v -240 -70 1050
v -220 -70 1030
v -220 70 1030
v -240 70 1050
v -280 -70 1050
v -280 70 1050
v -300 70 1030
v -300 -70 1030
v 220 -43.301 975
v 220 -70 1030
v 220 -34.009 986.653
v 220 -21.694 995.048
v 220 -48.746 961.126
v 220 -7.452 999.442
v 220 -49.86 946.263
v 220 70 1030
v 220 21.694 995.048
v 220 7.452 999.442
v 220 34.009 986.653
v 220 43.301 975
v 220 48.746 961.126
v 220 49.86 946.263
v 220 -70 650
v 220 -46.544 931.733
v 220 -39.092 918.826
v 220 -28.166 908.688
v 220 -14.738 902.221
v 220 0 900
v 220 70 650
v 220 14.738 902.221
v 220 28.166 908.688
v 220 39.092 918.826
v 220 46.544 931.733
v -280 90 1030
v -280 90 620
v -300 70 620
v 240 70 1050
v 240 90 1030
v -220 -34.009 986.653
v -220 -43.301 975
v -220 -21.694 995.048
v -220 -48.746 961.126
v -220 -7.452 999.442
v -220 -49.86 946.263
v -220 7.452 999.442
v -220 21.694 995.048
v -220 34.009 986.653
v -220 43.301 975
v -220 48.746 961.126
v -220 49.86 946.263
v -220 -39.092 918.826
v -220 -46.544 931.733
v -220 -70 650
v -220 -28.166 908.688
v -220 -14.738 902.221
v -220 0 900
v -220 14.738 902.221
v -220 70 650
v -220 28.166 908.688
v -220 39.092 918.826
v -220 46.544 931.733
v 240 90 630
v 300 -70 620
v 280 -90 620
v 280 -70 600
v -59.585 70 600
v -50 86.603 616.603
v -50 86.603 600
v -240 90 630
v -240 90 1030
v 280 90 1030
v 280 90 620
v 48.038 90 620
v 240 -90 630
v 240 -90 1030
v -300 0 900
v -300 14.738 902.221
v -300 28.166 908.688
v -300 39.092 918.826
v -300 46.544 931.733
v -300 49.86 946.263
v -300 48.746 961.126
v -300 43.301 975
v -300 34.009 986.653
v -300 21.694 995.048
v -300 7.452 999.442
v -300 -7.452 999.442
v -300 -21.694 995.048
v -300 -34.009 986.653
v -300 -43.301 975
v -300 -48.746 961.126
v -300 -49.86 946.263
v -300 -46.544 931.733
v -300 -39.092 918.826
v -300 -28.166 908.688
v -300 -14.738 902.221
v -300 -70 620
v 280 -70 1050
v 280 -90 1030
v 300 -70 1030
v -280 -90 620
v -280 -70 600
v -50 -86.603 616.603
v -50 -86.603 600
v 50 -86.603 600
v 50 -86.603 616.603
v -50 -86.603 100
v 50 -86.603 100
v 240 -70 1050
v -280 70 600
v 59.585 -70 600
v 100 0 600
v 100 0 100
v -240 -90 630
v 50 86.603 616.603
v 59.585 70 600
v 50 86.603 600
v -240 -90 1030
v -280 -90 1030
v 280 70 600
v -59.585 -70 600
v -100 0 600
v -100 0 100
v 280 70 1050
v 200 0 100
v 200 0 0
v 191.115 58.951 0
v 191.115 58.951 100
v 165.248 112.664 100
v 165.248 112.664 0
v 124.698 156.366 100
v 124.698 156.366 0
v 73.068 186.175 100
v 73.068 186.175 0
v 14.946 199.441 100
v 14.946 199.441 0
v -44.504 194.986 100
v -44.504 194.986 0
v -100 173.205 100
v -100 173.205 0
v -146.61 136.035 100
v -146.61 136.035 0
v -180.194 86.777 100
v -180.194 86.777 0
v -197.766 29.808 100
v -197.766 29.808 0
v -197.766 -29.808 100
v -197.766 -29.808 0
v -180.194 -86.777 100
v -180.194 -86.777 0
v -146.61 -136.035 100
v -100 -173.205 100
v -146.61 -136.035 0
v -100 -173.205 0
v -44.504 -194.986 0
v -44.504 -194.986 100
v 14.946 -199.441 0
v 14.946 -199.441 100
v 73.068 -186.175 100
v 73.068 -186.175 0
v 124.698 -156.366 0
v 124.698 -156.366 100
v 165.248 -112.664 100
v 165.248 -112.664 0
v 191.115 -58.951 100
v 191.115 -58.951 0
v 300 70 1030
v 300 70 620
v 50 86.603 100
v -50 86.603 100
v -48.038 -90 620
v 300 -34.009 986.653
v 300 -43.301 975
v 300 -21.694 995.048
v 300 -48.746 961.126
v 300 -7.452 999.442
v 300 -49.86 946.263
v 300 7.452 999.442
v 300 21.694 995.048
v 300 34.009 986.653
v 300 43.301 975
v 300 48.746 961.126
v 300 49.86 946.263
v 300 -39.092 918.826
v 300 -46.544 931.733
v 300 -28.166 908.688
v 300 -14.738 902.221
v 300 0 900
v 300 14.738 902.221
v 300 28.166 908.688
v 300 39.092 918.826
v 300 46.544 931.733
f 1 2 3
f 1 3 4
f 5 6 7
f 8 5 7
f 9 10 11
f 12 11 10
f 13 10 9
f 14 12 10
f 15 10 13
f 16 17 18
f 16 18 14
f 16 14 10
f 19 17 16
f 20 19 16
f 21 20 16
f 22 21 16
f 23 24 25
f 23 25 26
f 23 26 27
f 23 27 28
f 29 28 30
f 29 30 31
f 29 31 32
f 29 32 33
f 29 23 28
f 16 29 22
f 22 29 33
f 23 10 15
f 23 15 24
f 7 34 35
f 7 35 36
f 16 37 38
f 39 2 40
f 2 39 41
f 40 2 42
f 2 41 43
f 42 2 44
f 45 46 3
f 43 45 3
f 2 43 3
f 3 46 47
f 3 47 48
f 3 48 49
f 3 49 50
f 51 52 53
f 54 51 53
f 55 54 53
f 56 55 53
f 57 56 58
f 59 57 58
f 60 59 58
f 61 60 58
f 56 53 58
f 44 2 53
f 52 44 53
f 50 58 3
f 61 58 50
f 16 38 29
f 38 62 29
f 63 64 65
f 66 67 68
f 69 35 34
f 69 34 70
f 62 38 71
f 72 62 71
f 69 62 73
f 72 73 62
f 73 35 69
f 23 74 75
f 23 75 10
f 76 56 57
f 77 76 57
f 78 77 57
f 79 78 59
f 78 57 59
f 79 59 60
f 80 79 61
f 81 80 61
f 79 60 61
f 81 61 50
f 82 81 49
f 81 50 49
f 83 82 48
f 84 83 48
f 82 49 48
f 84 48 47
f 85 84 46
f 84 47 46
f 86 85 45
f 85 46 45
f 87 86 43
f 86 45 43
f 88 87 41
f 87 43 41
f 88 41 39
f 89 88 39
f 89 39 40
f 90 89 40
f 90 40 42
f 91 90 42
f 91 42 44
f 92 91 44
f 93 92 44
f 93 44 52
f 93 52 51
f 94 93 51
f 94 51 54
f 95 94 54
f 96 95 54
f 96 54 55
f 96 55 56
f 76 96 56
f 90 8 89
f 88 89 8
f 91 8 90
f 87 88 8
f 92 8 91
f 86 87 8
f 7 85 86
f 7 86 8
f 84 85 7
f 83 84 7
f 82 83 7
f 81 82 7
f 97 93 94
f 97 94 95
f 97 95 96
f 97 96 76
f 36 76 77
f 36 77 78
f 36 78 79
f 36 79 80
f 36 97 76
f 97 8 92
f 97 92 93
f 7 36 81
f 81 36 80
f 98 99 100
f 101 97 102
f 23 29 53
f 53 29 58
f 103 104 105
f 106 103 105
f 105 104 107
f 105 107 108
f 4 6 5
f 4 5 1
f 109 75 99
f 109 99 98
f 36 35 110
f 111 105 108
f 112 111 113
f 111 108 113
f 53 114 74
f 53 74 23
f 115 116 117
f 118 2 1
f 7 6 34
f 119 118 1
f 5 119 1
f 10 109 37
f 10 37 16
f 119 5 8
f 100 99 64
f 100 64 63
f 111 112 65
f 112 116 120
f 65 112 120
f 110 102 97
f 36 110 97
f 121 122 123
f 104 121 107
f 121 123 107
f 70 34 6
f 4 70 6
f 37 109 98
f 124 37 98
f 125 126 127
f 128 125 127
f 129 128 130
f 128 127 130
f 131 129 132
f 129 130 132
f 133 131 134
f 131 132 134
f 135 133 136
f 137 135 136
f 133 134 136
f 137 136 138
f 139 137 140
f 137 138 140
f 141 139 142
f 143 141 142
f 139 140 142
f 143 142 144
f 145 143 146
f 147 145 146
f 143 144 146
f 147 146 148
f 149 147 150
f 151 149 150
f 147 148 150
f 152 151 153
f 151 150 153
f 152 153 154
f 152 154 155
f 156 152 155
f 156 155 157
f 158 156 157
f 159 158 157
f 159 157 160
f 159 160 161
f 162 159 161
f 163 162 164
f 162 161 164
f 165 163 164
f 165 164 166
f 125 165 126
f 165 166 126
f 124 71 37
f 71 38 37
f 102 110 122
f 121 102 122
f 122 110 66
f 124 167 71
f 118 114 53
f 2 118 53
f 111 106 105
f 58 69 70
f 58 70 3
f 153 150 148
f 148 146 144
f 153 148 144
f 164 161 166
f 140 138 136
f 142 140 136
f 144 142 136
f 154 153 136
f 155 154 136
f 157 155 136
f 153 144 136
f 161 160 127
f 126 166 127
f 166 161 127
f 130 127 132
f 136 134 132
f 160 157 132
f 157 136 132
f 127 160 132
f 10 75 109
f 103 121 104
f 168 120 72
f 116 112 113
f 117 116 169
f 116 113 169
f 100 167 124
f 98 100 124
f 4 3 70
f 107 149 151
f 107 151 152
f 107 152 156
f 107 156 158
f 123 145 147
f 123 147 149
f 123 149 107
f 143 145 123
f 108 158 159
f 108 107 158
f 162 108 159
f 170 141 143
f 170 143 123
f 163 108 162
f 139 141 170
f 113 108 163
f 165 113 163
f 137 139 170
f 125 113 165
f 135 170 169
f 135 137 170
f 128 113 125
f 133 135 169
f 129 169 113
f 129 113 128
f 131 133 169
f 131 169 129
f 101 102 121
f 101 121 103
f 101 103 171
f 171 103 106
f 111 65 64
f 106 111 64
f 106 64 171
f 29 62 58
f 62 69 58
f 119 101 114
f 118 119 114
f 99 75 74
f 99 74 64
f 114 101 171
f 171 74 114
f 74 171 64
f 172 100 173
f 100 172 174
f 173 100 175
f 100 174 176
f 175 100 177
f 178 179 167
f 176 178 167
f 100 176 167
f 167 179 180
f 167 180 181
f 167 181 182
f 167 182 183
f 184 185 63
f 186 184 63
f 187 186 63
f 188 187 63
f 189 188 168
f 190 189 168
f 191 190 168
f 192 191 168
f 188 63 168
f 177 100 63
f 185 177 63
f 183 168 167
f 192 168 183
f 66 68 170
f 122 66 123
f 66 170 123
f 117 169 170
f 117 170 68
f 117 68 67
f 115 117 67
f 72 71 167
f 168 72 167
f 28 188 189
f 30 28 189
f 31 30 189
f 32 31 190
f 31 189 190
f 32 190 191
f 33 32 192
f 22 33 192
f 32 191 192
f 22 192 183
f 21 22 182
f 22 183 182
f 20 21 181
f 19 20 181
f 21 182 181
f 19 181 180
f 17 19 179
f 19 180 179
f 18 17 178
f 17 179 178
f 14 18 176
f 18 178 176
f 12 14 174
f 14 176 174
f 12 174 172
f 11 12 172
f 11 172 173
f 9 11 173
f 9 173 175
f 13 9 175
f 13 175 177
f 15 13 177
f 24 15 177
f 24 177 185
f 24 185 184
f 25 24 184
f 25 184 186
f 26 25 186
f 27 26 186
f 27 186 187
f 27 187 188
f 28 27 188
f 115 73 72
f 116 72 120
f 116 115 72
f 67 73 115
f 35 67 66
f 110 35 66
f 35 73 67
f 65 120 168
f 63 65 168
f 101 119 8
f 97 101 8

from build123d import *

# Parameters (mm, degrees)
CROQUIS1_R              = 200
SALIENTE_EXTRUIR1_DEPTH = 100
SALIENTE_EXTRUIR2_DEPTH = 500
CROQUIS3_W              = 600
CROQUIS3_H              = 180
SALIENTE_EXTRUIR3_DEPTH = 50
CROQUIS4_W              = 80
CROQUIS4_H              = 180
SALIENTE_EXTRUIR4_DEPTH = 400
CROQUIS5_R              = 50
CORTAR_EXTRUIR1_DEPTH   = 1226.765067213


with BuildPart() as part:
    # Croquis1 → Saliente-Extruir1 (new body)
    with BuildSketch(Plane.XY):
        Circle(CROQUIS1_R)
    extrude(amount=SALIENTE_EXTRUIR1_DEPTH)

    # Croquis2 → Saliente-Extruir2 (add)
    with BuildSketch(Plane.XY.offset(100)):
        Polygon((100, 0), (50, 86.602540378), (-50, 86.602540378), (-100, 0), (-50, -86.602540378), (50, -86.602540378), align=None)
    extrude(amount=SALIENTE_EXTRUIR2_DEPTH)

    # Croquis3 → Saliente-Extruir3 (add)
    with BuildSketch(Plane.XY.offset(600)):
        Rectangle(CROQUIS3_W, CROQUIS3_H)
    extrude(amount=SALIENTE_EXTRUIR3_DEPTH)

    # Croquis4 → Saliente-Extruir4 (add)
    with BuildSketch(Plane.XY.offset(650)):
        with Locations((-260, 0)):
            Rectangle(CROQUIS4_W, CROQUIS4_H)
        with Locations((260, 0)):
            Rectangle(CROQUIS4_W, CROQUIS4_H)
    extrude(amount=SALIENTE_EXTRUIR4_DEPTH)

    # Chaflán1
    # the kernel refuses this chamfer: 20 mm, written as the material it takes off along each edge
    with BuildSketch(Plane(origin=(-233.333333333, 76.666666667, 1036.666666667), x_dir=(0.7071067811865475, -0.7071067811865475, 0), z_dir=(0.5773502691896257, 0.5773502691896257, 0.5773502691896257)), Plane(origin=(-286.666666667, 76.666666667, 1036.666666667), x_dir=(0, -0.7071067811865475, 0.7071067811865475), z_dir=(-0.577350269189627, 0.5773502691896253, 0.5773502691896253)), Plane(origin=(-286.666666667, -76.666666667, 613.333333333), x_dir=(-0.7071067811865475, 0, 0.7071067811865475), z_dir=(-0.5773502691896257, -0.5773502691896257, -0.5773502691896257)), Plane(origin=(286.666666667, 76.666666667, 1036.666666667), x_dir=(0.7071067811865466, -0.7071067811865486, 0), z_dir=(0.5773502691896264, 0.5773502691896247, 0.5773502691896264)), Plane(origin=(286.666666667, 76.666666667, 613.333333333), x_dir=(-2.009718347115232e-15, -0.7071067811865475, -0.7071067811865475), z_dir=(0.5773502691896264, 0.5773502691896247, -0.5773502691896264)), Plane(origin=(286.666666667, -76.666666667, 613.333333333), x_dir=(0, -0.7071067811865475, 0.7071067811865475), z_dir=(0.5773502691896257, -0.5773502691896257, -0.5773502691896257)), Plane(origin=(233.333333333, 76.666666667, 1036.666666667), x_dir=(1.004859173557616e-15, -0.7071067811865475, 0.7071067811865475), z_dir=(-0.5773502691896263, 0.5773502691896251, 0.5773502691896258))) as chafl_n1_piece_1:
        Polygon((-14.142135624, 8.164965809), (14.142135624, 8.164965809), (0, -16.329931619), align=None)
    extrude(amount=25.403411844, mode=Mode.SUBTRACT)
    with BuildSketch(Plane(origin=(233.333333333, -76.666666667, 1036.666666667), x_dir=(0, 0.7071067811865472, 0.7071067811865478), z_dir=(-0.5773502691896256, -0.5773502691896261, 0.5773502691896256)), Plane(origin=(-233.333333333, -76.666666667, 1036.666666667), x_dir=(-0.7071067811865475, 0, 0.7071067811865475), z_dir=(0.5773502691896255, -0.5773502691896263, 0.5773502691896255)), Plane(origin=(-286.666666667, 76.666666667, 613.333333333), x_dir=(0, -0.7071067811865475, -0.7071067811865475), z_dir=(-0.5773502691896257, 0.5773502691896257, -0.5773502691896257)), Plane(origin=(-286.666666667, -76.666666667, 1036.666666667), x_dir=(-0.7071067811865475, 0, -0.7071067811865475), z_dir=(-0.5773502691896257, -0.5773502691896257, 0.5773502691896257)), Plane(origin=(286.666666667, -76.666666667, 1036.666666667), x_dir=(0.7071067811865475, 0.7071067811865475, 0), z_dir=(0.5773502691896257, -0.5773502691896257, 0.5773502691896257))) as chafl_n1_piece_2:
        Polygon((-14.142135624, -8.164965809), (14.142135624, -8.164965809), (0, 16.329931619), align=None)
    extrude(amount=25.403411844, mode=Mode.SUBTRACT)
    with BuildSketch(Plane(origin=(-220, 90, 650), x_dir=(-0.9996219169112968, 0.027495876610586317, 0), z_dir=(0, 0, 1)), Plane(origin=(220, -90, 650), x_dir=(0.9996219169112968, -0.027495876610585626, 0), z_dir=(0, 0, 1))) as chafl_n1_piece_3:
        with BuildLine():
            Line((20.573463904, 0), (-1.130943098, 20.54235587))
            Line((-1.130943098, 20.54235587), (-1.530791864, 20.53135752))
            ThreePointArc((-1.530791864, 20.53135752), (-0.682584541, 10.267956593), (-0.399848767, -0.010998351))
            Line((-0.399848767, -0.010998351), (0.010998351, -0.399848767))
            ThreePointArc((0.010998351, -0.399848767), (10.289953294, -0.117112992), (20.584462254, -0.399848767))
            Line((20.584462254, -0.399848767), (20.573463904, 0))
        make_face()
    extrude(amount=451.433659759, mode=Mode.SUBTRACT)
    with BuildSketch(Plane(origin=(-220, -90, 650), x_dir=(-0.9996219169112968, -0.027495876610586282, 0), z_dir=(0, 0, 1)), Plane(origin=(220, 90, 650), x_dir=(0.9996219169112968, 0.027495876610586355, 0), z_dir=(0, 0, 1))) as chafl_n1_piece_4:
        with BuildLine():
            Line((20.573463904, 0), (-1.130943098, -20.54235587))
            Line((-1.130943098, -20.54235587), (-1.530791864, -20.53135752))
            ThreePointArc((-1.530791864, -20.53135752), (-0.682584541, -10.267956593), (-0.399848767, 0.010998351))
            Line((-0.399848767, 0.010998351), (0.010998351, 0.399848767))
            ThreePointArc((0.010998351, 0.399848767), (10.289953294, 0.117112992), (20.584462254, 0.399848767))
            Line((20.584462254, 0.399848767), (20.573463904, 0))
        make_face()
    extrude(amount=451.433659759, mode=Mode.SUBTRACT)
    with BuildSketch(Plane(origin=(-300, 90, 548.566340241), x_dir=(0.9996219169112968, 0.027495876610586282, 0), z_dir=(0, 0, 1)), Plane(origin=(300, 90, 1101.433659759), x_dir=(-0.9996219169112968, 0.027495876610586282, 0), z_dir=(0, 0, -1))) as chafl_n1_piece_5:
        with BuildLine():
            Line((20.573463904, 0), (-1.130943098, -20.54235587))
            Line((-1.130943098, -20.54235587), (-1.530791864, -20.53135752))
            ThreePointArc((-1.530791864, -20.53135752), (-0.682584541, -10.267956593), (-0.399848767, 0.010998351))
            Line((-0.399848767, 0.010998351), (0.010998351, 0.399848767))
            ThreePointArc((0.010998351, 0.399848767), (10.289953294, 0.117112992), (20.584462254, 0.399848767))
            Line((20.584462254, 0.399848767), (20.573463904, 0))
        make_face()
    extrude(amount=552.867319519, mode=Mode.SUBTRACT)
    with BuildSketch(Plane(origin=(-300, -90, 548.566340241), x_dir=(0.9996219169112968, -0.027495876610586282, 0), z_dir=(0, 0, 1)), Plane(origin=(300, -90, 1101.433659759), x_dir=(-0.9996219169112968, -0.027495876610586282, 0), z_dir=(0, 0, -1))) as chafl_n1_piece_6:
        with BuildLine():
            Line((20.573463904, 0), (-1.130943098, 20.54235587))
            Line((-1.130943098, 20.54235587), (-1.530791864, 20.53135752))
            ThreePointArc((-1.530791864, 20.53135752), (-0.682584541, 10.267956593), (-0.399848767, -0.010998351))
            Line((-0.399848767, -0.010998351), (0.010998351, -0.399848767))
            ThreePointArc((0.010998351, -0.399848767), (10.289953294, -0.117112992), (20.584462254, -0.399848767))
            Line((20.584462254, -0.399848767), (20.573463904, 0))
        make_face()
    extrude(amount=552.867319519, mode=Mode.SUBTRACT)
    with BuildSketch(Plane(origin=(-351.433659759, -90, 1050), x_dir=(0, -0.02749587661058643, -0.9996219169112968), z_dir=(1, 0, 0)), Plane(origin=(-168.566340241, 90, 1050), x_dir=(0, 0.02749587661058643, -0.9996219169112968), z_dir=(-1, 0, 0))) as chafl_n1_piece_7:
        with BuildLine():
            Line((20.573463904, 0), (-1.130943098, 20.54235587))
            Line((-1.130943098, 20.54235587), (-1.530791864, 20.53135752))
            ThreePointArc((-1.530791864, 20.53135752), (-0.682584541, 10.267956593), (-0.399848767, -0.010998351))
            Line((-0.399848767, -0.010998351), (0.010998351, -0.399848767))
            ThreePointArc((0.010998351, -0.399848767), (10.289953294, -0.117112992), (20.584462254, -0.399848767))
            Line((20.584462254, -0.399848767), (20.573463904, 0))
        make_face()
    extrude(amount=182.867319519, mode=Mode.SUBTRACT)
    with BuildSketch(Plane(origin=(-220, -141.433659759, 1050), x_dir=(0.02749587661058643, 0, -0.9996219169112968), z_dir=(0, 1, 0)), Plane(origin=(220, -141.433659759, 1050), x_dir=(0.9996219169112969, 0, 0.027495876610582178), z_dir=(0, 1, 0))) as chafl_n1_piece_8:
        with BuildLine():
            Line((20.573463904, 0), (-1.130943098, 20.54235587))
            Line((-1.130943098, 20.54235587), (-1.530791864, 20.53135752))
            ThreePointArc((-1.530791864, 20.53135752), (-0.682584541, 10.267956593), (-0.399848767, -0.010998351))
            Line((-0.399848767, -0.010998351), (0.010998351, -0.399848767))
            ThreePointArc((0.010998351, -0.399848767), (10.289953294, -0.117112992), (20.584462254, -0.399848767))
            Line((20.584462254, -0.399848767), (20.573463904, 0))
        make_face()
    extrude(amount=282.867319519, mode=Mode.SUBTRACT)
    with BuildSketch(Plane(origin=(-300, 141.433659759, 1050), x_dir=(0.9996219169112969, 0, 0.02749587661058214), z_dir=(0, -1, 0)), Plane(origin=(300, 141.433659759, 1050), x_dir=(0.027495876610587815, 0, -0.9996219169112968), z_dir=(0, -1, 0)), Plane(origin=(-300, -141.433659759, 600), x_dir=(0.9996219169112968, 0, -0.027495876610587663), z_dir=(0, 1, 0)), Plane(origin=(300, 141.433659759, 600), x_dir=(-0.9996219169112968, 0, -0.027495876610587663), z_dir=(0, -1, 0))) as chafl_n1_piece_9:
        with BuildLine():
            Line((20.573463904, 0), (-1.130943098, -20.54235587))
            Line((-1.130943098, -20.54235587), (-1.530791864, -20.53135752))
            ThreePointArc((-1.530791864, -20.53135752), (-0.682584541, -10.267956593), (-0.399848767, 0.010998351))
            Line((-0.399848767, 0.010998351), (0.010998351, 0.399848767))
            ThreePointArc((0.010998351, 0.399848767), (10.289953294, 0.117112992), (20.584462254, 0.399848767))
            Line((20.584462254, 0.399848767), (20.573463904, 0))
        make_face()
    extrude(amount=282.867319519, mode=Mode.SUBTRACT)
    with BuildSketch(Plane(origin=(168.566340241, 90, 1050), x_dir=(0, 0.02749587661058643, -0.9996219169112968), z_dir=(1, 0, 0)), Plane(origin=(351.433659759, -90, 1050), x_dir=(0, -0.02749587661058643, -0.9996219169112968), z_dir=(-1, 0, 0))) as chafl_n1_piece_10:
        with BuildLine():
            Line((20.573463904, 0), (-1.130943098, -20.54235587))
            Line((-1.130943098, -20.54235587), (-1.530791864, -20.53135752))
            ThreePointArc((-1.530791864, -20.53135752), (-0.682584541, -10.267956593), (-0.399848767, 0.010998351))
            Line((-0.399848767, 0.010998351), (0.010998351, 0.399848767))
            ThreePointArc((0.010998351, 0.399848767), (10.289953294, 0.117112992), (20.584462254, 0.399848767))
            Line((20.584462254, 0.399848767), (20.573463904, 0))
        make_face()
    extrude(amount=182.867319519, mode=Mode.SUBTRACT)
    with BuildSketch(Plane(origin=(-351.433659759, 90, 600), x_dir=(0, 0.027495876610586282, 0.9996219169112968), z_dir=(1, 0, 0))) as chafl_n1_piece_11_section:
        with BuildLine():
            Line((20.573463904, 0), (-1.130943098, 20.54235587))
            Line((-1.130943098, 20.54235587), (-1.530791864, 20.53135752))
            ThreePointArc((-1.530791864, 20.53135752), (-0.682584541, 10.267956593), (-0.399848767, -0.010998351))
            Line((-0.399848767, -0.010998351), (0.010998351, -0.399848767))
            ThreePointArc((0.010998351, -0.399848767), (10.289953294, -0.117112992), (20.584462254, -0.399848767))
            Line((20.584462254, -0.399848767), (20.573463904, 0))
        make_face()
    chafl_n1_piece_11 = extrude(amount=702.867319519, mode=Mode.PRIVATE)
    chafl_n1_piece_11 = split(chafl_n1_piece_11, bisect_by=Plane(origin=(-86.659672544, 23.106124943, 609.411385689), z_dir=(-0.8660254037844387, 0.5, 0)), keep=Keep.TOP, mode=Mode.PRIVATE)
    chafl_n1_piece_11 = split(chafl_n1_piece_11, bisect_by=Plane(origin=(-200.134238493, 86.602540378, 609.411385689), z_dir=(0, 1, 0)), keep=Keep.TOP, mode=Mode.PRIVATE)
    add(chafl_n1_piece_11, mode=Mode.SUBTRACT)
    with BuildSketch(Plane(origin=(-351.433659759, 90, 600), x_dir=(0, 0.027495876610586282, 0.9996219169112968), z_dir=(1, 0, 0))) as chafl_n1_piece_12_section:
        with BuildLine():
            Line((20.573463904, 0), (-1.130943098, 20.54235587))
            Line((-1.130943098, 20.54235587), (-1.530791864, 20.53135752))
            ThreePointArc((-1.530791864, 20.53135752), (-0.682584541, 10.267956593), (-0.399848767, -0.010998351))
            Line((-0.399848767, -0.010998351), (0.010998351, -0.399848767))
            ThreePointArc((0.010998351, -0.399848767), (10.289953294, -0.117112992), (20.584462254, -0.399848767))
            Line((20.584462254, -0.399848767), (20.573463904, 0))
        make_face()
    chafl_n1_piece_12 = extrude(amount=702.867319519, mode=Mode.PRIVATE)
    chafl_n1_piece_12 = split(chafl_n1_piece_12, bisect_by=Plane(origin=(-90.598996107, 16.283016385, 605.202318191), z_dir=(-0.8660254037844387, 0.5, 0)), keep=Keep.TOP, mode=Mode.PRIVATE)
    chafl_n1_piece_12 = split(chafl_n1_piece_12, bisect_by=Plane(origin=(-202.385280529, 86.602540378, 605.202318191), z_dir=(0, -1, 0)), keep=Keep.TOP, mode=Mode.PRIVATE)
    add(chafl_n1_piece_12, mode=Mode.SUBTRACT)
    with BuildSketch(Plane(origin=(-351.433659759, 90, 600), x_dir=(0, 0.027495876610586282, 0.9996219169112968), z_dir=(1, 0, 0))) as chafl_n1_piece_13_section:
        with BuildLine():
            Line((20.573463904, 0), (-1.130943098, 20.54235587))
            Line((-1.130943098, 20.54235587), (-1.530791864, 20.53135752))
            ThreePointArc((-1.530791864, 20.53135752), (-0.682584541, 10.267956593), (-0.399848767, -0.010998351))
            Line((-0.399848767, -0.010998351), (0.010998351, -0.399848767))
            ThreePointArc((0.010998351, -0.399848767), (10.289953294, -0.117112992), (20.584462254, -0.399848767))
            Line((20.584462254, -0.399848767), (20.573463904, 0))
        make_face()
    chafl_n1_piece_13 = extrude(amount=702.867319519, mode=Mode.PRIVATE)
    chafl_n1_piece_13 = split(chafl_n1_piece_13, bisect_by=Plane(origin=(-36.633682246, 109.753681839, 609.395218204), z_dir=(0.8660254037844387, -0.5, 0)), keep=Keep.TOP, mode=Mode.PRIVATE)
    chafl_n1_piece_13 = split(chafl_n1_piece_13, bisect_by=Plane(origin=(0, 86.602540378, 609.395218204), z_dir=(0, 1, 0)), keep=Keep.TOP, mode=Mode.PRIVATE)
    chafl_n1_piece_13 = split(chafl_n1_piece_13, bisect_by=Plane(origin=(36.633682246, 109.753681839, 609.395218204), z_dir=(-0.8660254037844387, -0.5000000000000001, 0)), keep=Keep.TOP, mode=Mode.PRIVATE)
    add(chafl_n1_piece_13, mode=Mode.SUBTRACT)
    with BuildSketch(Plane(origin=(-351.433659759, 90, 600), x_dir=(0, 0.027495876610586282, 0.9996219169112968), z_dir=(1, 0, 0))) as chafl_n1_piece_14_section:
        with BuildLine():
            Line((20.573463904, 0), (-1.130943098, 20.54235587))
            Line((-1.130943098, 20.54235587), (-1.530791864, 20.53135752))
            ThreePointArc((-1.530791864, 20.53135752), (-0.682584541, 10.267956593), (-0.399848767, -0.010998351))
            Line((-0.399848767, -0.010998351), (0.010998351, -0.399848767))
            ThreePointArc((0.010998351, -0.399848767), (10.289953294, -0.117112992), (20.584462254, -0.399848767))
            Line((20.584462254, -0.399848767), (20.573463904, 0))
        make_face()
    chafl_n1_piece_14 = extrude(amount=702.867319519, mode=Mode.PRIVATE)
    chafl_n1_piece_14 = split(chafl_n1_piece_14, bisect_by=Plane(origin=(200.134238493, 86.602540378, 609.411385689), z_dir=(0, 1, 0)), keep=Keep.TOP, mode=Mode.PRIVATE)
    chafl_n1_piece_14 = split(chafl_n1_piece_14, bisect_by=Plane(origin=(86.659672544, 23.106124943, 609.411385689), z_dir=(0.8660254037844387, 0.5000000000000001, 0)), keep=Keep.TOP, mode=Mode.PRIVATE)
    add(chafl_n1_piece_14, mode=Mode.SUBTRACT)
    with BuildSketch(Plane(origin=(-351.433659759, 90, 600), x_dir=(0, 0.027495876610586282, 0.9996219169112968), z_dir=(1, 0, 0))) as chafl_n1_piece_15_section:
        with BuildLine():
            Line((20.573463904, 0), (-1.130943098, 20.54235587))
            Line((-1.130943098, 20.54235587), (-1.530791864, 20.53135752))
            ThreePointArc((-1.530791864, 20.53135752), (-0.682584541, 10.267956593), (-0.399848767, -0.010998351))
            Line((-0.399848767, -0.010998351), (0.010998351, -0.399848767))
            ThreePointArc((0.010998351, -0.399848767), (10.289953294, -0.117112992), (20.584462254, -0.399848767))
            Line((20.584462254, -0.399848767), (20.573463904, 0))
        make_face()
    chafl_n1_piece_15 = extrude(amount=702.867319519, mode=Mode.PRIVATE)
    chafl_n1_piece_15 = split(chafl_n1_piece_15, bisect_by=Plane(origin=(202.385280529, 86.602540378, 605.202318191), z_dir=(0, -1, 0)), keep=Keep.TOP, mode=Mode.PRIVATE)
    chafl_n1_piece_15 = split(chafl_n1_piece_15, bisect_by=Plane(origin=(90.598996107, 16.283016385, 605.202318191), z_dir=(0.8660254037844387, 0.5000000000000001, 0)), keep=Keep.TOP, mode=Mode.PRIVATE)
    add(chafl_n1_piece_15, mode=Mode.SUBTRACT)
    with BuildSketch(Plane(origin=(351.433659759, -90, 600), x_dir=(0, 0.9996219169112968, -0.0274958766105877), z_dir=(-1, 0, 0))) as chafl_n1_piece_16_section:
        with BuildLine():
            Line((20.573463904, 0), (-1.130943098, -20.54235587))
            Line((-1.130943098, -20.54235587), (-1.530791864, -20.53135752))
            ThreePointArc((-1.530791864, -20.53135752), (-0.682584541, -10.267956593), (-0.399848767, 0.010998351))
            Line((-0.399848767, 0.010998351), (0.010998351, 0.399848767))
            ThreePointArc((0.010998351, 0.399848767), (10.289953294, 0.117112992), (20.584462254, 0.399848767))
            Line((20.584462254, 0.399848767), (20.573463904, 0))
        make_face()
    chafl_n1_piece_16 = extrude(amount=702.867319519, mode=Mode.PRIVATE)
    chafl_n1_piece_16 = split(chafl_n1_piece_16, bisect_by=Plane(origin=(90.598996107, -16.283016385, 605.202318191), z_dir=(0.8660254037844389, -0.49999999999999956, 0)), keep=Keep.TOP, mode=Mode.PRIVATE)
    chafl_n1_piece_16 = split(chafl_n1_piece_16, bisect_by=Plane(origin=(202.385280529, -86.602540378, 605.202318191), z_dir=(0, 1, 0)), keep=Keep.TOP, mode=Mode.PRIVATE)
    add(chafl_n1_piece_16, mode=Mode.SUBTRACT)
    with BuildSketch(Plane(origin=(351.433659759, -90, 600), x_dir=(0, 0.9996219169112968, -0.0274958766105877), z_dir=(-1, 0, 0))) as chafl_n1_piece_17_section:
        with BuildLine():
            Line((20.573463904, 0), (-1.130943098, -20.54235587))
            Line((-1.130943098, -20.54235587), (-1.530791864, -20.53135752))
            ThreePointArc((-1.530791864, -20.53135752), (-0.682584541, -10.267956593), (-0.399848767, 0.010998351))
            Line((-0.399848767, 0.010998351), (0.010998351, 0.399848767))
            ThreePointArc((0.010998351, 0.399848767), (10.289953294, 0.117112992), (20.584462254, 0.399848767))
            Line((20.584462254, 0.399848767), (20.573463904, 0))
        make_face()
    chafl_n1_piece_17 = extrude(amount=702.867319519, mode=Mode.PRIVATE)
    chafl_n1_piece_17 = split(chafl_n1_piece_17, bisect_by=Plane(origin=(86.659672544, -23.106124943, 609.411385689), z_dir=(0.8660254037844389, -0.49999999999999956, 0)), keep=Keep.TOP, mode=Mode.PRIVATE)
    chafl_n1_piece_17 = split(chafl_n1_piece_17, bisect_by=Plane(origin=(200.134238493, -86.602540378, 609.411385689), z_dir=(0, -1, 0)), keep=Keep.TOP, mode=Mode.PRIVATE)
    add(chafl_n1_piece_17, mode=Mode.SUBTRACT)
    with BuildSketch(Plane(origin=(351.433659759, -90, 600), x_dir=(0, 0.9996219169112968, -0.0274958766105877), z_dir=(-1, 0, 0))) as chafl_n1_piece_18_section:
        with BuildLine():
            Line((20.573463904, 0), (-1.130943098, -20.54235587))
            Line((-1.130943098, -20.54235587), (-1.530791864, -20.53135752))
            ThreePointArc((-1.530791864, -20.53135752), (-0.682584541, -10.267956593), (-0.399848767, 0.010998351))
            Line((-0.399848767, 0.010998351), (0.010998351, 0.399848767))
            ThreePointArc((0.010998351, 0.399848767), (10.289953294, 0.117112992), (20.584462254, 0.399848767))
            Line((20.584462254, 0.399848767), (20.573463904, 0))
        make_face()
    chafl_n1_piece_18 = extrude(amount=702.867319519, mode=Mode.PRIVATE)
    chafl_n1_piece_18 = split(chafl_n1_piece_18, bisect_by=Plane(origin=(36.633682246, -109.753681839, 609.395218204), z_dir=(-0.8660254037844389, 0.49999999999999956, 0)), keep=Keep.TOP, mode=Mode.PRIVATE)
    chafl_n1_piece_18 = split(chafl_n1_piece_18, bisect_by=Plane(origin=(0, -86.602540378, 609.395218204), z_dir=(0, -1, 0)), keep=Keep.TOP, mode=Mode.PRIVATE)
    chafl_n1_piece_18 = split(chafl_n1_piece_18, bisect_by=Plane(origin=(-36.633682246, -109.753681839, 609.395218204), z_dir=(0.8660254037844387, 0.5000000000000001, 0)), keep=Keep.TOP, mode=Mode.PRIVATE)
    add(chafl_n1_piece_18, mode=Mode.SUBTRACT)
    with BuildSketch(Plane(origin=(351.433659759, -90, 600), x_dir=(0, 0.9996219169112968, -0.0274958766105877), z_dir=(-1, 0, 0))) as chafl_n1_piece_19_section:
        with BuildLine():
            Line((20.573463904, 0), (-1.130943098, -20.54235587))
            Line((-1.130943098, -20.54235587), (-1.530791864, -20.53135752))
            ThreePointArc((-1.530791864, -20.53135752), (-0.682584541, -10.267956593), (-0.399848767, 0.010998351))
            Line((-0.399848767, 0.010998351), (0.010998351, 0.399848767))
            ThreePointArc((0.010998351, 0.399848767), (10.289953294, 0.117112992), (20.584462254, 0.399848767))
            Line((20.584462254, 0.399848767), (20.573463904, 0))
        make_face()
    chafl_n1_piece_19 = extrude(amount=702.867319519, mode=Mode.PRIVATE)
    chafl_n1_piece_19 = split(chafl_n1_piece_19, bisect_by=Plane(origin=(-202.385280529, -86.602540378, 605.202318191), z_dir=(0, 1, 0)), keep=Keep.TOP, mode=Mode.PRIVATE)
    chafl_n1_piece_19 = split(chafl_n1_piece_19, bisect_by=Plane(origin=(-90.598996107, -16.283016385, 605.202318191), z_dir=(-0.8660254037844387, -0.5000000000000001, 0)), keep=Keep.TOP, mode=Mode.PRIVATE)
    add(chafl_n1_piece_19, mode=Mode.SUBTRACT)
    with BuildSketch(Plane(origin=(351.433659759, -90, 600), x_dir=(0, 0.9996219169112968, -0.0274958766105877), z_dir=(-1, 0, 0))) as chafl_n1_piece_20_section:
        with BuildLine():
            Line((20.573463904, 0), (-1.130943098, -20.54235587))
            Line((-1.130943098, -20.54235587), (-1.530791864, -20.53135752))
            ThreePointArc((-1.530791864, -20.53135752), (-0.682584541, -10.267956593), (-0.399848767, 0.010998351))
            Line((-0.399848767, 0.010998351), (0.010998351, 0.399848767))
            ThreePointArc((0.010998351, 0.399848767), (10.289953294, 0.117112992), (20.584462254, 0.399848767))
            Line((20.584462254, 0.399848767), (20.573463904, 0))
        make_face()
    chafl_n1_piece_20 = extrude(amount=702.867319519, mode=Mode.PRIVATE)
    chafl_n1_piece_20 = split(chafl_n1_piece_20, bisect_by=Plane(origin=(-200.134238493, -86.602540378, 609.411385689), z_dir=(0, -1, 0)), keep=Keep.TOP, mode=Mode.PRIVATE)
    chafl_n1_piece_20 = split(chafl_n1_piece_20, bisect_by=Plane(origin=(-86.659672544, -23.106124943, 609.411385689), z_dir=(-0.8660254037844387, -0.5000000000000001, 0)), keep=Keep.TOP, mode=Mode.PRIVATE)
    add(chafl_n1_piece_20, mode=Mode.SUBTRACT)
    with BuildSketch(Plane(origin=(-220, 90, 650), x_dir=(0, 0.027495876610586282, -0.9996219169112968), z_dir=(1, 0, 0)), Plane(origin=(220, -90, 650), x_dir=(0, -0.027495876610586282, -0.9996219169112968), z_dir=(-1, 0, 0))) as chafl_n1_piece_21:
        with BuildLine():
            Line((20.573463904, 0), (-1.130943098, -20.54235587))
            Line((-1.130943098, -20.54235587), (-1.530791864, -20.53135752))
            ThreePointArc((-1.530791864, -20.53135752), (-0.682584541, -10.267956593), (-0.399848767, 0.010998351))
            Line((-0.399848767, 0.010998351), (0.010998351, 0.399848767))
            ThreePointArc((0.010998351, 0.399848767), (10.289953294, 0.117112992), (20.584462254, 0.399848767))
            Line((20.584462254, 0.399848767), (20.573463904, 0))
        make_face()
    extrude(amount=440, mode=Mode.SUBTRACT)
    with BuildSketch(Plane(origin=(-220, 90, 598.566340241), x_dir=(-0.9996219169112968, 0.027495876610586317, 0), z_dir=(0, 0, 1))) as chafl_n1_piece_22a_section:
        with BuildLine():
            Line((20.573463904, 0), (-1.130943098, 20.54235587))
            Line((-1.130943098, 20.54235587), (-1.530791864, 20.53135752))
            ThreePointArc((-1.530791864, 20.53135752), (-0.682584541, 10.267956593), (-0.399848767, -0.010998351))
            Line((-0.399848767, -0.010998351), (0.010998351, -0.399848767))
            ThreePointArc((0.010998351, -0.399848767), (10.289953294, -0.117112992), (20.584462254, -0.399848767))
            Line((20.584462254, -0.399848767), (20.573463904, 0))
        make_face()
    chafl_n1_piece_22a = extrude(amount=502.867319519, mode=Mode.PRIVATE)
    chafl_n1_piece_22a = split(chafl_n1_piece_22a, bisect_by=Plane(origin=(-226.595872536, 83.404127464, 650), z_dir=(0, 0, -1)), keep=Keep.TOP, mode=Mode.PRIVATE)
    with BuildSketch(Plane(origin=(-271.433659759, 90, 650), x_dir=(0, 0.027495876610586282, -0.9996219169112968), z_dir=(1, 0, 0))) as chafl_n1_piece_22b_section:
        with BuildLine():
            Line((20.573463904, 0), (-1.130943098, -20.54235587))
            Line((-1.130943098, -20.54235587), (-1.530791864, -20.53135752))
            ThreePointArc((-1.530791864, -20.53135752), (-0.682584541, -10.267956593), (-0.399848767, 0.010998351))
            Line((-0.399848767, 0.010998351), (0.010998351, 0.399848767))
            ThreePointArc((0.010998351, 0.399848767), (10.289953294, 0.117112992), (20.584462254, 0.399848767))
            Line((20.584462254, 0.399848767), (20.573463904, 0))
        make_face()
    chafl_n1_piece_22b = extrude(amount=491.433659759, mode=Mode.PRIVATE)
    chafl_n1_piece_22b = split(chafl_n1_piece_22b, bisect_by=Plane(origin=(-220, 83.404127464, 643.404127464), z_dir=(-1, 0, 0)), keep=Keep.TOP, mode=Mode.PRIVATE)
    chafl_n1_piece_22 = chafl_n1_piece_22a & chafl_n1_piece_22b
    add(chafl_n1_piece_22, mode=Mode.SUBTRACT)
    with BuildSketch(Plane(origin=(220, -90, 598.566340241), x_dir=(0.9996219169112968, -0.027495876610586317, 0), z_dir=(0, 0, 1))) as chafl_n1_piece_23a_section:
        with BuildLine():
            Line((20.573463904, 0), (-1.130943098, 20.54235587))
            Line((-1.130943098, 20.54235587), (-1.530791864, 20.53135752))
            ThreePointArc((-1.530791864, 20.53135752), (-0.682584541, 10.267956593), (-0.399848767, -0.010998351))
            Line((-0.399848767, -0.010998351), (0.010998351, -0.399848767))
            ThreePointArc((0.010998351, -0.399848767), (10.289953294, -0.117112992), (20.584462254, -0.399848767))
            Line((20.584462254, -0.399848767), (20.573463904, 0))
        make_face()
    chafl_n1_piece_23a = extrude(amount=502.867319519, mode=Mode.PRIVATE)
    chafl_n1_piece_23a = split(chafl_n1_piece_23a, bisect_by=Plane(origin=(226.595872536, -83.404127464, 650), z_dir=(0, 0, -1)), keep=Keep.TOP, mode=Mode.PRIVATE)
    with BuildSketch(Plane(origin=(271.433659759, -90, 650), x_dir=(0, -0.027495876610586282, -0.9996219169112968), z_dir=(-1, 0, 0))) as chafl_n1_piece_23b_section:
        with BuildLine():
            Line((20.573463904, 0), (-1.130943098, -20.54235587))
            Line((-1.130943098, -20.54235587), (-1.530791864, -20.53135752))
            ThreePointArc((-1.530791864, -20.53135752), (-0.682584541, -10.267956593), (-0.399848767, 0.010998351))
            Line((-0.399848767, 0.010998351), (0.010998351, 0.399848767))
            ThreePointArc((0.010998351, 0.399848767), (10.289953294, 0.117112992), (20.584462254, 0.399848767))
            Line((20.584462254, 0.399848767), (20.573463904, 0))
        make_face()
    chafl_n1_piece_23b = extrude(amount=491.433659759, mode=Mode.PRIVATE)
    chafl_n1_piece_23b = split(chafl_n1_piece_23b, bisect_by=Plane(origin=(220, -83.404127464, 643.404127464), z_dir=(1, 0, 0)), keep=Keep.TOP, mode=Mode.PRIVATE)
    chafl_n1_piece_23 = chafl_n1_piece_23a & chafl_n1_piece_23b
    add(chafl_n1_piece_23, mode=Mode.SUBTRACT)
    with BuildSketch(Plane(origin=(220, -90, 650), x_dir=(0, -0.027495876610586282, -0.9996219169112968), z_dir=(-1, 0, 0))) as chafl_n1_piece_24a_section:
        with BuildLine():
            Line((20.573463904, 0), (-1.130943098, -20.54235587))
            Line((-1.130943098, -20.54235587), (-1.530791864, -20.53135752))
            ThreePointArc((-1.530791864, -20.53135752), (-0.682584541, -10.267956593), (-0.399848767, 0.010998351))
            Line((-0.399848767, 0.010998351), (0.010998351, 0.399848767))
            ThreePointArc((0.010998351, 0.399848767), (10.289953294, 0.117112992), (20.584462254, 0.399848767))
            Line((20.584462254, 0.399848767), (20.573463904, 0))
        make_face()
    chafl_n1_piece_24a = extrude(amount=491.433659759, mode=Mode.PRIVATE)
    chafl_n1_piece_24a = split(chafl_n1_piece_24a, bisect_by=Plane(origin=(-220, -83.404127464, 643.404127464), z_dir=(-1, 0, 0)), keep=Keep.TOP, mode=Mode.PRIVATE)
    with BuildSketch(Plane(origin=(-220, -90, 598.566340241), x_dir=(-0.9996219169112968, -0.027495876610586317, 0), z_dir=(0, 0, 1))) as chafl_n1_piece_24b_section:
        with BuildLine():
            Line((20.573463904, 0), (-1.130943098, -20.54235587))
            Line((-1.130943098, -20.54235587), (-1.530791864, -20.53135752))
            ThreePointArc((-1.530791864, -20.53135752), (-0.682584541, -10.267956593), (-0.399848767, 0.010998351))
            Line((-0.399848767, 0.010998351), (0.010998351, 0.399848767))
            ThreePointArc((0.010998351, 0.399848767), (10.289953294, 0.117112992), (20.584462254, 0.399848767))
            Line((20.584462254, 0.399848767), (20.573463904, 0))
        make_face()
    chafl_n1_piece_24b = extrude(amount=502.867319519, mode=Mode.PRIVATE)
    chafl_n1_piece_24b = split(chafl_n1_piece_24b, bisect_by=Plane(origin=(-226.595872536, -83.404127464, 650), z_dir=(0, 0, -1)), keep=Keep.TOP, mode=Mode.PRIVATE)
    chafl_n1_piece_24 = chafl_n1_piece_24a & chafl_n1_piece_24b
    add(chafl_n1_piece_24, mode=Mode.SUBTRACT)
    with BuildSketch(Plane(origin=(-220, 90, 650), x_dir=(0, 0.027495876610586282, -0.9996219169112968), z_dir=(1, 0, 0))) as chafl_n1_piece_25a_section:
        with BuildLine():
            Line((20.573463904, 0), (-1.130943098, -20.54235587))
            Line((-1.130943098, -20.54235587), (-1.530791864, -20.53135752))
            ThreePointArc((-1.530791864, -20.53135752), (-0.682584541, -10.267956593), (-0.399848767, 0.010998351))
            Line((-0.399848767, 0.010998351), (0.010998351, 0.399848767))
            ThreePointArc((0.010998351, 0.399848767), (10.289953294, 0.117112992), (20.584462254, 0.399848767))
            Line((20.584462254, 0.399848767), (20.573463904, 0))
        make_face()
    chafl_n1_piece_25a = extrude(amount=491.433659759, mode=Mode.PRIVATE)
    chafl_n1_piece_25a = split(chafl_n1_piece_25a, bisect_by=Plane(origin=(220, 83.404127464, 643.404127464), z_dir=(1, 0, 0)), keep=Keep.TOP, mode=Mode.PRIVATE)
    with BuildSketch(Plane(origin=(220, 90, 598.566340241), x_dir=(0.9996219169112968, 0.027495876610586317, 0), z_dir=(0, 0, 1))) as chafl_n1_piece_25b_section:
        with BuildLine():
            Line((20.573463904, 0), (-1.130943098, -20.54235587))
            Line((-1.130943098, -20.54235587), (-1.530791864, -20.53135752))
            ThreePointArc((-1.530791864, -20.53135752), (-0.682584541, -10.267956593), (-0.399848767, 0.010998351))
            Line((-0.399848767, 0.010998351), (0.010998351, 0.399848767))
            ThreePointArc((0.010998351, 0.399848767), (10.289953294, 0.117112992), (20.584462254, 0.399848767))
            Line((20.584462254, 0.399848767), (20.573463904, 0))
        make_face()
    chafl_n1_piece_25b = extrude(amount=502.867319519, mode=Mode.PRIVATE)
    chafl_n1_piece_25b = split(chafl_n1_piece_25b, bisect_by=Plane(origin=(226.595872536, 83.404127464, 650), z_dir=(0, 0, -1)), keep=Keep.TOP, mode=Mode.PRIVATE)
    chafl_n1_piece_25 = chafl_n1_piece_25a & chafl_n1_piece_25b
    add(chafl_n1_piece_25, mode=Mode.SUBTRACT)

    # Croquis5 → Cortar-Extruir1 (cut, through all)
    with BuildSketch(Plane(origin=(300, 0, 0), x_dir=(0, 0, -1), z_dir=(1, 0, 0))):
        with Locations((-950, 0)):
            Circle(CROQUIS5_R)
    extrude(amount=-CORTAR_EXTRUIR1_DEPTH, mode=Mode.SUBTRACT)


solid = part.part
